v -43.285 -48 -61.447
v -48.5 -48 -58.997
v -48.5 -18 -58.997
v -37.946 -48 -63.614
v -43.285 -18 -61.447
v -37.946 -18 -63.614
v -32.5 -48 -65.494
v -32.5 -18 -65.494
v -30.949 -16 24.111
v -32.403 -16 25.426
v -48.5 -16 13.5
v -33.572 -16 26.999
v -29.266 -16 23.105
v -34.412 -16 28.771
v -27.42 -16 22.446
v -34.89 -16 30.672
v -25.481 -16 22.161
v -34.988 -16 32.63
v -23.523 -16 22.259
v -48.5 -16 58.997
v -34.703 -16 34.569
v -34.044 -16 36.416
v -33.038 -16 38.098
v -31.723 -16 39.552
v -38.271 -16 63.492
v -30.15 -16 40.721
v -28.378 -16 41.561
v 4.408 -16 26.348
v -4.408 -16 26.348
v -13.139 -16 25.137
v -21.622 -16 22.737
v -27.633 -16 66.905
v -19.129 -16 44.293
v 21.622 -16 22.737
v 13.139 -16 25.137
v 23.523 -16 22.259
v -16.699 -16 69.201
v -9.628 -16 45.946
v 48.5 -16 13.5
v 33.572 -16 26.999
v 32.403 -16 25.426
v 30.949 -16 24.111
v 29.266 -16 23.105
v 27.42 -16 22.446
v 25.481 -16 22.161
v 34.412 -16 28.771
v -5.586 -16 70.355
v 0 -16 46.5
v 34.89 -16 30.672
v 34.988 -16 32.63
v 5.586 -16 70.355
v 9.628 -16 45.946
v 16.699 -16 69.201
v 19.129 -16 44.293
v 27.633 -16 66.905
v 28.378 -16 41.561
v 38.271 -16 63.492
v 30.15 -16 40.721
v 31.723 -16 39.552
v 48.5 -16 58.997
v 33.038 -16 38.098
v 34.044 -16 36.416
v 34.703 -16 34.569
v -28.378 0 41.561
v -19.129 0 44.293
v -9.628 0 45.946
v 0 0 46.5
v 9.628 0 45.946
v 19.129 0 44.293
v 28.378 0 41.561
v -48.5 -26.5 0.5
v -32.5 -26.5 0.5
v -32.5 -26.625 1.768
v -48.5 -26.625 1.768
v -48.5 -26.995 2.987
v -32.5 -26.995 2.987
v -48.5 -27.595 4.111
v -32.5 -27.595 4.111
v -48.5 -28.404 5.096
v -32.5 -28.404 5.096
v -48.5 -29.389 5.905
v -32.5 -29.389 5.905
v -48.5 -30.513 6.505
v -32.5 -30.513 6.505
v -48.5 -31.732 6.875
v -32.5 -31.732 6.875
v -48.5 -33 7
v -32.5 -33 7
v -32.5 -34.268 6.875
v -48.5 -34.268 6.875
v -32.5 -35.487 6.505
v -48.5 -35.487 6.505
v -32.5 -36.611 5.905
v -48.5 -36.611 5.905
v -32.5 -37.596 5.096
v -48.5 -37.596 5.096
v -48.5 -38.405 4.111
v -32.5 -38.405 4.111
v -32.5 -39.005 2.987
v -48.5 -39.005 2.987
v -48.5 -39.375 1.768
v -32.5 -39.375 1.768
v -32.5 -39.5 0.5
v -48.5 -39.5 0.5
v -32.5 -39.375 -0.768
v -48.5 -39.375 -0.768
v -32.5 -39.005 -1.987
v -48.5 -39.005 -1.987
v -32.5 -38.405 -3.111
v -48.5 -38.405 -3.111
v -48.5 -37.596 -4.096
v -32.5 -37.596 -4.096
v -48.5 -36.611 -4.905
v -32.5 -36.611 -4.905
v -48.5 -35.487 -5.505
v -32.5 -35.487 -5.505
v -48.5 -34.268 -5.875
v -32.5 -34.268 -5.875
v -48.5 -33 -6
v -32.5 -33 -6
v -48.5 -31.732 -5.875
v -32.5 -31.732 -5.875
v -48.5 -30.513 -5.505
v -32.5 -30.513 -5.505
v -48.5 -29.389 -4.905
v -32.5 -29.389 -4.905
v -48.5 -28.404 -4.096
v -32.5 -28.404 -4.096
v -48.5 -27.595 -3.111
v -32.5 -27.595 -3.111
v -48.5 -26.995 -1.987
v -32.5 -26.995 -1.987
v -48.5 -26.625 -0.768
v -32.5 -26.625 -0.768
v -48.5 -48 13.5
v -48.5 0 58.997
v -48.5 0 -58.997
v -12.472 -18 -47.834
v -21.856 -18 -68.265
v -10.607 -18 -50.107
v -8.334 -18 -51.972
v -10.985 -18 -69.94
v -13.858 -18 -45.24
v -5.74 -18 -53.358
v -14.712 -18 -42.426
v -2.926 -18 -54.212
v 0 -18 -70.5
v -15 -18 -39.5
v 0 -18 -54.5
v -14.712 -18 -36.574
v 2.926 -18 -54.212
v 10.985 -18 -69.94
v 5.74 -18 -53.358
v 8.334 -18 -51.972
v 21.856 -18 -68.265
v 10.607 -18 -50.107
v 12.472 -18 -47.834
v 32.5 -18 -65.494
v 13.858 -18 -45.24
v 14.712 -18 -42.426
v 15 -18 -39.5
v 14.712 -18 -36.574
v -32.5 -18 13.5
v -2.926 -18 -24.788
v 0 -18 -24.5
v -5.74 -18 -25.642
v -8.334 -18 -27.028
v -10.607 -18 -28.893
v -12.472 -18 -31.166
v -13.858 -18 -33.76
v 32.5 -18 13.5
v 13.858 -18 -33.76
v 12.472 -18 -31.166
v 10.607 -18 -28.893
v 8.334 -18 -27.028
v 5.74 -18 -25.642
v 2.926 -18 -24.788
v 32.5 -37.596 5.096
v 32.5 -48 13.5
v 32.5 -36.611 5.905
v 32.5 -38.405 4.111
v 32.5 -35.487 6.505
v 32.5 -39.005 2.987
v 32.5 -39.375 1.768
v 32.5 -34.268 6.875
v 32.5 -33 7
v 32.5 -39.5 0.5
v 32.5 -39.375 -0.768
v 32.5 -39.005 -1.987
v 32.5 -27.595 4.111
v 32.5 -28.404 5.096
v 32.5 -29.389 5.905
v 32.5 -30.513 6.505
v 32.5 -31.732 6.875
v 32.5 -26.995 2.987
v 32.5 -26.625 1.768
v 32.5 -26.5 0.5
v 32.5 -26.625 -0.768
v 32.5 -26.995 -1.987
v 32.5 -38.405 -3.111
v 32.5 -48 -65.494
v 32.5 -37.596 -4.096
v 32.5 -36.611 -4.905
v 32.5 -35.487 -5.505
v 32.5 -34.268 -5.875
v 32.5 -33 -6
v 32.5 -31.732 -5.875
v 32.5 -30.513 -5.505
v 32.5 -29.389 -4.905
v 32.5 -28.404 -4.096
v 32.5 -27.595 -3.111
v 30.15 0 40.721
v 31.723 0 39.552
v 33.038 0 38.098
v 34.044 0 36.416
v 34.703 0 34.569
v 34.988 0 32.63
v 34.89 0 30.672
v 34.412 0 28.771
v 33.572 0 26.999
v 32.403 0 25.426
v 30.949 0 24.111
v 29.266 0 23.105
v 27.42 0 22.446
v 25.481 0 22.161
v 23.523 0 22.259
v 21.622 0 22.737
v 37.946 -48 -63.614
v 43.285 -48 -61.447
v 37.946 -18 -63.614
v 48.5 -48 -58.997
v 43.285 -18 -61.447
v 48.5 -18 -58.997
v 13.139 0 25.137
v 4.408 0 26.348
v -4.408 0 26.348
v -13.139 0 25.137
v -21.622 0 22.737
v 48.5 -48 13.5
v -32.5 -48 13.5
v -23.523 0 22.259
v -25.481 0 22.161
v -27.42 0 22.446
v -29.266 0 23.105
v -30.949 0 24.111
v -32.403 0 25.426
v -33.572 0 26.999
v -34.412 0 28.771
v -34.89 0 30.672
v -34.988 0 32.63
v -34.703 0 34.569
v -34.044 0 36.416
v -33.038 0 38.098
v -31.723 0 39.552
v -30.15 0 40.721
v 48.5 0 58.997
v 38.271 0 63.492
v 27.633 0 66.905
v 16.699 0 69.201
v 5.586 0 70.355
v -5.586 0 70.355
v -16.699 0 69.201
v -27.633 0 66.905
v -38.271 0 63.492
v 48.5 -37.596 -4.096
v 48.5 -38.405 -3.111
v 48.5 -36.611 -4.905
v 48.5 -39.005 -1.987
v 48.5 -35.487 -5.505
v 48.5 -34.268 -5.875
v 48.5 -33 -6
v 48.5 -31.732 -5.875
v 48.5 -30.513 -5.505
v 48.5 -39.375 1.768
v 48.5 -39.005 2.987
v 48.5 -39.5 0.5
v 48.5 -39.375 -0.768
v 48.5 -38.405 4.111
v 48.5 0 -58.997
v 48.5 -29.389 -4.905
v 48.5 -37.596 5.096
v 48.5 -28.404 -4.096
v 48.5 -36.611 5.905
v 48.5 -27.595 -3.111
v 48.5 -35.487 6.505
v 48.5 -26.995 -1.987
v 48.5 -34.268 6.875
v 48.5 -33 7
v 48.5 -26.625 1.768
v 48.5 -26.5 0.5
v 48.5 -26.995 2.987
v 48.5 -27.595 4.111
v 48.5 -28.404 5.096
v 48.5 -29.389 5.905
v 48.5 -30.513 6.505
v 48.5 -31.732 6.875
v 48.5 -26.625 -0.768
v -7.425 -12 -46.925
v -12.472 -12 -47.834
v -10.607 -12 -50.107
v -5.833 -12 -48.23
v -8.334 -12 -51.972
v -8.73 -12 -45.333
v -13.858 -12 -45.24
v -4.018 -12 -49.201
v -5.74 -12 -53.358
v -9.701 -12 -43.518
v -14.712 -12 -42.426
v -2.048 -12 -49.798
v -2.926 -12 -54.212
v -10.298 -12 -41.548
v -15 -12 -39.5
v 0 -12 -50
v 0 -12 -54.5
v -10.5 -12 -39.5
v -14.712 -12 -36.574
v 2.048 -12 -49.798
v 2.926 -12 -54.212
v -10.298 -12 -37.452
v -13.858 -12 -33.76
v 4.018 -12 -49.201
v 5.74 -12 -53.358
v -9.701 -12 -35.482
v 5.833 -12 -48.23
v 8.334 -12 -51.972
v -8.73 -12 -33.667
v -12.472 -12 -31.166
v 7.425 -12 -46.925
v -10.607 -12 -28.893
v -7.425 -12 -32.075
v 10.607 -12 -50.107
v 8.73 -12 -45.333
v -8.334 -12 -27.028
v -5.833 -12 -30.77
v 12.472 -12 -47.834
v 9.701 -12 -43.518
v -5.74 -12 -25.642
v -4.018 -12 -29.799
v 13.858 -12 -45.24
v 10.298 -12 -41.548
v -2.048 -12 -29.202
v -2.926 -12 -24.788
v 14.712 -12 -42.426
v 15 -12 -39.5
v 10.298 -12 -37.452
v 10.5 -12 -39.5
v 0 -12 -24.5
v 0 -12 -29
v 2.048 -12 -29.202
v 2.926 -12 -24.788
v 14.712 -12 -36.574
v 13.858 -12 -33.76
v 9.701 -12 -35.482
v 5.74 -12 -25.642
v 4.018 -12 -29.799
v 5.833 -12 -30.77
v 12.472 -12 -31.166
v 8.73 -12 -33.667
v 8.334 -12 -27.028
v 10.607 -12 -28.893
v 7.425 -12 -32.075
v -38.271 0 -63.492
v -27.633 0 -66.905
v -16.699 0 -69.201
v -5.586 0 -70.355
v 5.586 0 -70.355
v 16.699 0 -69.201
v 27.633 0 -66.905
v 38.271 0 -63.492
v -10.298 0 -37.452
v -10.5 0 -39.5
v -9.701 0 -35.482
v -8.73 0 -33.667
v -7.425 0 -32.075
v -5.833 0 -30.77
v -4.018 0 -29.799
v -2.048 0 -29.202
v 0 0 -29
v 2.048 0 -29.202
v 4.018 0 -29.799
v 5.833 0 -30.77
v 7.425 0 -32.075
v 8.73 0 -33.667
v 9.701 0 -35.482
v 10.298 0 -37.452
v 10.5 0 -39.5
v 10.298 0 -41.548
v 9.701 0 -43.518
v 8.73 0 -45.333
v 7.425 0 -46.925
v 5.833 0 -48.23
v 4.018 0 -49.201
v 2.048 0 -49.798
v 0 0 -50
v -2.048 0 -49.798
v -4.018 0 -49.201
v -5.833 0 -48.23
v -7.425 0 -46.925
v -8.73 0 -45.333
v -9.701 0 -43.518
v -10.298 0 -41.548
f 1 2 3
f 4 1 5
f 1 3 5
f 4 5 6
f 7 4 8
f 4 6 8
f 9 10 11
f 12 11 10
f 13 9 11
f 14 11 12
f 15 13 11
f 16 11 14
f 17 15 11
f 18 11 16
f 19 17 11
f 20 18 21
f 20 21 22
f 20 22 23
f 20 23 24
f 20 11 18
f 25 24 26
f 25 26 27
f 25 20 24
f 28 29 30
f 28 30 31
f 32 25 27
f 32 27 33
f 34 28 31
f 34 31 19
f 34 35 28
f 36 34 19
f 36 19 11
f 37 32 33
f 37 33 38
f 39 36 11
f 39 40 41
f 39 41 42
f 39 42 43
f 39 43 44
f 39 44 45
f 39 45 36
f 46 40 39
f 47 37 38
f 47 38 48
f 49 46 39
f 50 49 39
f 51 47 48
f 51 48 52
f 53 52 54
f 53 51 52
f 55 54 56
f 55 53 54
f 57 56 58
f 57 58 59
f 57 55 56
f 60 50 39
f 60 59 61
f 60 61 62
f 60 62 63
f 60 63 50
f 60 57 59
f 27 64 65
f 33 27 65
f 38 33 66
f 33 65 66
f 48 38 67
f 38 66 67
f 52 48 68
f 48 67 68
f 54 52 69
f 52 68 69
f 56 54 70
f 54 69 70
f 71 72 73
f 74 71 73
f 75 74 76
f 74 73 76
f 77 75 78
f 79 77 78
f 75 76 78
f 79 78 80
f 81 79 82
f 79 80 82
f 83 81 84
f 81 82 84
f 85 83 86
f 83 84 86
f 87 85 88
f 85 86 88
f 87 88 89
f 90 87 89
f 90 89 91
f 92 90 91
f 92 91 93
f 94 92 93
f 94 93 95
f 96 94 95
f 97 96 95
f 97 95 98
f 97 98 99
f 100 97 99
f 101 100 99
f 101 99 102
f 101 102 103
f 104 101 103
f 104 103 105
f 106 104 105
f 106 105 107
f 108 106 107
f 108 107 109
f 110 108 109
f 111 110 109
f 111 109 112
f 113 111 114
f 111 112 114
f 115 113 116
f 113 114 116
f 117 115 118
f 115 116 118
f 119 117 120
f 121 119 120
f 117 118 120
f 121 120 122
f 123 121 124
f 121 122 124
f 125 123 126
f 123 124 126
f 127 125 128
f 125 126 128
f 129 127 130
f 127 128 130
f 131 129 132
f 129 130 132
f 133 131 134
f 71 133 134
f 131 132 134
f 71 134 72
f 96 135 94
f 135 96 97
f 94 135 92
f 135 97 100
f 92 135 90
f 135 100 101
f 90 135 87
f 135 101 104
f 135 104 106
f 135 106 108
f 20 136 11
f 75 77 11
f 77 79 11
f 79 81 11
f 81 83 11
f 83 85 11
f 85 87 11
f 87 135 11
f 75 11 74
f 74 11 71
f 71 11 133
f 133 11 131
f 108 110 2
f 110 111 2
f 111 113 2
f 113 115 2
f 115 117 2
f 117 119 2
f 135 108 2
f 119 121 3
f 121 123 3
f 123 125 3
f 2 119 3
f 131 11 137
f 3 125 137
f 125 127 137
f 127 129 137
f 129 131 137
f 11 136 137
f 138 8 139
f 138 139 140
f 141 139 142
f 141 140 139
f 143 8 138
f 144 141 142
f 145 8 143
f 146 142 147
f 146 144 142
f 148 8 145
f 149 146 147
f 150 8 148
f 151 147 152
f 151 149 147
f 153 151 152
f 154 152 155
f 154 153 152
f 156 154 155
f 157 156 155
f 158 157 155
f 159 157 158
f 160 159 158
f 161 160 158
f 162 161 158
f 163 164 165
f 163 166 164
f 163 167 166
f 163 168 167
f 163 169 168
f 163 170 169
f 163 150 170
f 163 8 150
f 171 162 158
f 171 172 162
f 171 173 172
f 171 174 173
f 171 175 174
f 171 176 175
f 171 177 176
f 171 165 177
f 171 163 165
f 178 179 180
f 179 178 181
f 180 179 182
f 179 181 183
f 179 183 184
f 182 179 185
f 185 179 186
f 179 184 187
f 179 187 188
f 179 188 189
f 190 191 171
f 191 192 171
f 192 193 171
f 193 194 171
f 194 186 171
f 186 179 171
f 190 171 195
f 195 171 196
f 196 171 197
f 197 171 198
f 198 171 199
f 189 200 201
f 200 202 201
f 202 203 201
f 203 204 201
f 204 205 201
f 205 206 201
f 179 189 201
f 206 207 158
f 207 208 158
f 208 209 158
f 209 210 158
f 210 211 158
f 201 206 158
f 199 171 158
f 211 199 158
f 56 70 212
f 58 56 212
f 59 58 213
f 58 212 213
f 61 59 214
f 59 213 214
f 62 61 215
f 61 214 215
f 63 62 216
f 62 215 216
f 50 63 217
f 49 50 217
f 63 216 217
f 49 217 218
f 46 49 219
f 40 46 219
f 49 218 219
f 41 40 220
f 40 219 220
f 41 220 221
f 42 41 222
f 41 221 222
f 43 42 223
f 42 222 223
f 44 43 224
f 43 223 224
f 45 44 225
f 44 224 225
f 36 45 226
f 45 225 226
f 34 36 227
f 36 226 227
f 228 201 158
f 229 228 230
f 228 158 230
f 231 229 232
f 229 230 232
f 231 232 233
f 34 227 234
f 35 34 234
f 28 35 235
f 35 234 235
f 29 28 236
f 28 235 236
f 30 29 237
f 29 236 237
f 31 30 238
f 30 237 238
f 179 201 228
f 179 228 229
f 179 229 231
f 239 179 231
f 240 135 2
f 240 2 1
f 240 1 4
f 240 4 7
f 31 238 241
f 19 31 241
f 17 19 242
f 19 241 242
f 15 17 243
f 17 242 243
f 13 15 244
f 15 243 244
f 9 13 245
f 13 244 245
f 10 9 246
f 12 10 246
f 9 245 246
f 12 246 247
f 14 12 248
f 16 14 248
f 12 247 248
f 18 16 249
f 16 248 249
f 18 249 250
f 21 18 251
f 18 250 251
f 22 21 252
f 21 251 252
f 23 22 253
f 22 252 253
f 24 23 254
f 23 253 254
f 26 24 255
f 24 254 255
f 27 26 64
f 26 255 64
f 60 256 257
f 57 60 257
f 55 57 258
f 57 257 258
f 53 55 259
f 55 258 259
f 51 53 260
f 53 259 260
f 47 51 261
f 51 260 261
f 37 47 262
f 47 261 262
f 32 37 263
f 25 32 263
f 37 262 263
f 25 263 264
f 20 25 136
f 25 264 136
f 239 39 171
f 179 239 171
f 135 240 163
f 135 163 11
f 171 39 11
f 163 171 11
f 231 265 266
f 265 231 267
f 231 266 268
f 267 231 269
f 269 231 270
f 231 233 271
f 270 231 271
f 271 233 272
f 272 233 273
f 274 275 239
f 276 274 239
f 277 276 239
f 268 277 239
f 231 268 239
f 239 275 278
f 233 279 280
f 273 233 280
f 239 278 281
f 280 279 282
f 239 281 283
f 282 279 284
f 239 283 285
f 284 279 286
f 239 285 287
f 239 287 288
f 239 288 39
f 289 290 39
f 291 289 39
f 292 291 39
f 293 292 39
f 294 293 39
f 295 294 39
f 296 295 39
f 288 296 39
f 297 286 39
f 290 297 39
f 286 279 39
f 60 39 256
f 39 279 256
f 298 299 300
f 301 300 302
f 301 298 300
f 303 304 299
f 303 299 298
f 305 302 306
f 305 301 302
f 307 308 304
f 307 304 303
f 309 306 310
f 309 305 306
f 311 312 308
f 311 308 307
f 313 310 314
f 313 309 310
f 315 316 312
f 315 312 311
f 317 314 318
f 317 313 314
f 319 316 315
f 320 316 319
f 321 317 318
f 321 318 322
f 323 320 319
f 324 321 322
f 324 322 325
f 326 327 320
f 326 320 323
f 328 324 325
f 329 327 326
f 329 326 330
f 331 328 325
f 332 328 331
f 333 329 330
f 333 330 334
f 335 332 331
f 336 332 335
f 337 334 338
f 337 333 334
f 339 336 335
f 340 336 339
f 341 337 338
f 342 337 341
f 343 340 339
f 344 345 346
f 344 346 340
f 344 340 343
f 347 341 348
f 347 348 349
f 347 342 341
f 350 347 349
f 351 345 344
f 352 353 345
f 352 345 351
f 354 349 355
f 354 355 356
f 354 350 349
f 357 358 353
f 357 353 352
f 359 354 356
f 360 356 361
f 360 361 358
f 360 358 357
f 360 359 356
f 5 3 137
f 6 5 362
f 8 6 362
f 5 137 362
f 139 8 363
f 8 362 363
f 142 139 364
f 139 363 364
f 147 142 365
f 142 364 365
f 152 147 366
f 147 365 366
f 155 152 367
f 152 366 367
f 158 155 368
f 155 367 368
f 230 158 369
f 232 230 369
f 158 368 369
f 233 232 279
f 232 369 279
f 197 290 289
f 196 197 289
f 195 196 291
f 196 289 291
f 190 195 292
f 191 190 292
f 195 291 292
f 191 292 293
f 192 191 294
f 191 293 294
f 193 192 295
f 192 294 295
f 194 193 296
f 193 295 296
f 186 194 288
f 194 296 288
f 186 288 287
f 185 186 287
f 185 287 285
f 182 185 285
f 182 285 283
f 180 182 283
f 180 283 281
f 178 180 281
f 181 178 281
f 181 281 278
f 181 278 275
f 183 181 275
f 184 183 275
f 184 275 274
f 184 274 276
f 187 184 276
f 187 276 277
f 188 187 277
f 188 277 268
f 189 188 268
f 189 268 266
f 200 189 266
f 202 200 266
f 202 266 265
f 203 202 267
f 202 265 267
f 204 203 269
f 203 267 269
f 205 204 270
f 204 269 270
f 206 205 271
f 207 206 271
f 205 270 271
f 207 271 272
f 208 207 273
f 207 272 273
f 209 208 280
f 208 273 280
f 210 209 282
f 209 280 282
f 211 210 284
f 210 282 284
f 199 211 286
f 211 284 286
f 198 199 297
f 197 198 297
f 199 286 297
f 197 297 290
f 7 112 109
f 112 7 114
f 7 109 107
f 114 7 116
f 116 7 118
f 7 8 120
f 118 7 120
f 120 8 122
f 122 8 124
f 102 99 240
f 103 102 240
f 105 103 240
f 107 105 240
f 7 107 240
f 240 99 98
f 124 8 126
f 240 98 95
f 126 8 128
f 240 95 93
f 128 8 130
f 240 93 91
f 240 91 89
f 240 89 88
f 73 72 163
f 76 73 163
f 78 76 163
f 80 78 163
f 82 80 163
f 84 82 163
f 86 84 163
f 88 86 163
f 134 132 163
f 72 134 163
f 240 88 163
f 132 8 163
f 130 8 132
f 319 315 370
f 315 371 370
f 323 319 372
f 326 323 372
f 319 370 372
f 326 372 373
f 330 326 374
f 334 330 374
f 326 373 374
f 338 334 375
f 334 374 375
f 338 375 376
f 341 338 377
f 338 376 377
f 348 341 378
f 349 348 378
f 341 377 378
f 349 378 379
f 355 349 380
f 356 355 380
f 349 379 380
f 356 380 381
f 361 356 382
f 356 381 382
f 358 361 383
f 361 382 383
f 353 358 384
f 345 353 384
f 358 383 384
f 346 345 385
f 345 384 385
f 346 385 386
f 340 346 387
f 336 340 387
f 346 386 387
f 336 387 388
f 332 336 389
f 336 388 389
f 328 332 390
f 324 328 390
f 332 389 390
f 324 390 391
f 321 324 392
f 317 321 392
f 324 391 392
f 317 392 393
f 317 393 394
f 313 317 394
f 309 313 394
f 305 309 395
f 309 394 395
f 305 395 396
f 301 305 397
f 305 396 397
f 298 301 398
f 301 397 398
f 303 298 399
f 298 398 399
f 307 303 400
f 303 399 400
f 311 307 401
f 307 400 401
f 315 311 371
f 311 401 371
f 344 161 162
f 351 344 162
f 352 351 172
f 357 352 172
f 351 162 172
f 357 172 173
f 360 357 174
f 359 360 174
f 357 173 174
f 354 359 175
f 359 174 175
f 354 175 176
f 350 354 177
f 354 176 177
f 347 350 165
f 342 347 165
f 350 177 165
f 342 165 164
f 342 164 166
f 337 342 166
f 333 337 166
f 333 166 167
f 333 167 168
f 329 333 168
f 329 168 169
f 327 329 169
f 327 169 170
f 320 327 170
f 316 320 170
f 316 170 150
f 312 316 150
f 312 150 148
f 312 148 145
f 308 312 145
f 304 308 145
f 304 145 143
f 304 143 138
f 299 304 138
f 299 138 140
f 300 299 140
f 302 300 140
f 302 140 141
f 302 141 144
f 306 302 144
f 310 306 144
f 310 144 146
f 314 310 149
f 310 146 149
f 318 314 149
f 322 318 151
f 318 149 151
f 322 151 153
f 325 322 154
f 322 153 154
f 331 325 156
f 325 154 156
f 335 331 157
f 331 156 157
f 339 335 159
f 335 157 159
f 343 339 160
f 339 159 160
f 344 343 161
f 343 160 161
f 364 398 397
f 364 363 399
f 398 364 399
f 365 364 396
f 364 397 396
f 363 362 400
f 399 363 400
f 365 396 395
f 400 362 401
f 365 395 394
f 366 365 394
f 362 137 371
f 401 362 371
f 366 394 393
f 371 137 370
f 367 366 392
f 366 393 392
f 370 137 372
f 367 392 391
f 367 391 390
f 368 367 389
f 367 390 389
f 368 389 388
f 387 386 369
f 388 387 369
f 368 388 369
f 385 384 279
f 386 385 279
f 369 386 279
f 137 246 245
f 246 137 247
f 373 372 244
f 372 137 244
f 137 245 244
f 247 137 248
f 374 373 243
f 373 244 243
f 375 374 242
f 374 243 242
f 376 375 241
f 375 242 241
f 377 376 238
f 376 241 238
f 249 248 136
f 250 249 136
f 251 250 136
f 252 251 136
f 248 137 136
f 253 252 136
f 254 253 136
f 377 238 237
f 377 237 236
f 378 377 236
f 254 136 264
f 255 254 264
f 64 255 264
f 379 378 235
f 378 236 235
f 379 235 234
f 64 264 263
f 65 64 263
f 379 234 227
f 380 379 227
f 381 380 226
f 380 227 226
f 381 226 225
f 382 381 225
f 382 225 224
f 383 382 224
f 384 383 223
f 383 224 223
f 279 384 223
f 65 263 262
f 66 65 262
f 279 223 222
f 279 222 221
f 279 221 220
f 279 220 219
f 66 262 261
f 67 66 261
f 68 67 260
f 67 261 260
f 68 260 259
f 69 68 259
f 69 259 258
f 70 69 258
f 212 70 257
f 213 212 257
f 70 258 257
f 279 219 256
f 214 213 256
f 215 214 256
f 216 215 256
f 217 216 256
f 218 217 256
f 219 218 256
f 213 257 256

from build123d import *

# Parameters (mm, degrees)
F1_DEPTH       = 16
F2_DEPTH       = 18
F4_D           = 21
F4_CBORE_D     = 30
F4_CBORE_DEPTH = 6
F6_DEPTH       = 30
F8_D           = 13


with BuildPart() as f1:
    # F0 (on Front) → F1 (new body)
    with BuildSketch(Plane.XZ):
        with BuildLine():
            Line((-48.5, 13.5), (48.5, 13.5))
            Line((48.5, 13.5), (48.5, 58.997409))
            ThreePointArc((48.5, 58.997409), (0, 70.5), (-48.5, 58.997409))
            Line((-48.5, 58.997409), (-48.5, 13.5))
        make_face()
        with BuildLine():
            ThreePointArc((-28.378378, 41.561164), (0, 46.5), (28.378378, 41.561164))
            ThreePointArc((28.378378, 41.561164), (34.412043, 28.770742), (21.621622, 22.737077))
            ThreePointArc((21.621622, 22.737077), (0, 26.5), (-21.621622, 22.737077))
            ThreePointArc((-21.621622, 22.737077), (-34.412043, 28.770742), (-28.378378, 41.561164))
        make_face(mode=Mode.SUBTRACT)
    extrude(amount=F1_DEPTH)

    # F0 (on Front) → F2 (join)
    with BuildSketch(Plane.XZ):
        with BuildLine():
            ThreePointArc((-48.5, -58.997409), (0, -70.5), (48.5, -58.997409))
            Line((48.5, -58.997409), (48.5, 13.5))
            Line((48.5, 13.5), (-48.5, 13.5))
            Line((-48.5, 13.5), (-48.5, -58.997409))
        make_face()
    extrude(amount=F2_DEPTH)

    # F4 (through all)
    with Locations(Plane.XZ.offset(18)):
        with Locations((0, -39.5)):
            CounterBoreHole(F4_D / 2, F4_CBORE_D / 2, F4_CBORE_DEPTH)

    # F5 (on face) → F6 (join)
    with BuildSketch(Plane.XZ.offset(18)):
        with BuildLine():
            Line((-48.5, 13.5), (-48.5, -58.997409))
            ThreePointArc((-48.5, -58.997409), (-40.630053, -62.565972), (-32.5, -65.493932))
            Line((-32.5, -65.493932), (-32.5, 13.5))
            Line((-32.5, 13.5), (-48.5, 13.5))
        make_face()
        with BuildLine():
            ThreePointArc((32.5, -65.493932), (40.630053, -62.565972), (48.5, -58.997409))
            Line((48.5, -58.997409), (48.5, 13.5))
            Line((48.5, 13.5), (32.5, 13.5))
            Line((32.5, 13.5), (32.5, -65.493932))
        make_face()
    extrude(amount=F6_DEPTH)

    # F8 (through all)
    with Locations(Plane(origin=(-48.5, 0, 0), x_dir=(0, -1, 0), z_dir=(-1, 0, 0))):
        with Locations((33, 0.5)):
            Hole(F8_D / 2)


solid = f1.part
